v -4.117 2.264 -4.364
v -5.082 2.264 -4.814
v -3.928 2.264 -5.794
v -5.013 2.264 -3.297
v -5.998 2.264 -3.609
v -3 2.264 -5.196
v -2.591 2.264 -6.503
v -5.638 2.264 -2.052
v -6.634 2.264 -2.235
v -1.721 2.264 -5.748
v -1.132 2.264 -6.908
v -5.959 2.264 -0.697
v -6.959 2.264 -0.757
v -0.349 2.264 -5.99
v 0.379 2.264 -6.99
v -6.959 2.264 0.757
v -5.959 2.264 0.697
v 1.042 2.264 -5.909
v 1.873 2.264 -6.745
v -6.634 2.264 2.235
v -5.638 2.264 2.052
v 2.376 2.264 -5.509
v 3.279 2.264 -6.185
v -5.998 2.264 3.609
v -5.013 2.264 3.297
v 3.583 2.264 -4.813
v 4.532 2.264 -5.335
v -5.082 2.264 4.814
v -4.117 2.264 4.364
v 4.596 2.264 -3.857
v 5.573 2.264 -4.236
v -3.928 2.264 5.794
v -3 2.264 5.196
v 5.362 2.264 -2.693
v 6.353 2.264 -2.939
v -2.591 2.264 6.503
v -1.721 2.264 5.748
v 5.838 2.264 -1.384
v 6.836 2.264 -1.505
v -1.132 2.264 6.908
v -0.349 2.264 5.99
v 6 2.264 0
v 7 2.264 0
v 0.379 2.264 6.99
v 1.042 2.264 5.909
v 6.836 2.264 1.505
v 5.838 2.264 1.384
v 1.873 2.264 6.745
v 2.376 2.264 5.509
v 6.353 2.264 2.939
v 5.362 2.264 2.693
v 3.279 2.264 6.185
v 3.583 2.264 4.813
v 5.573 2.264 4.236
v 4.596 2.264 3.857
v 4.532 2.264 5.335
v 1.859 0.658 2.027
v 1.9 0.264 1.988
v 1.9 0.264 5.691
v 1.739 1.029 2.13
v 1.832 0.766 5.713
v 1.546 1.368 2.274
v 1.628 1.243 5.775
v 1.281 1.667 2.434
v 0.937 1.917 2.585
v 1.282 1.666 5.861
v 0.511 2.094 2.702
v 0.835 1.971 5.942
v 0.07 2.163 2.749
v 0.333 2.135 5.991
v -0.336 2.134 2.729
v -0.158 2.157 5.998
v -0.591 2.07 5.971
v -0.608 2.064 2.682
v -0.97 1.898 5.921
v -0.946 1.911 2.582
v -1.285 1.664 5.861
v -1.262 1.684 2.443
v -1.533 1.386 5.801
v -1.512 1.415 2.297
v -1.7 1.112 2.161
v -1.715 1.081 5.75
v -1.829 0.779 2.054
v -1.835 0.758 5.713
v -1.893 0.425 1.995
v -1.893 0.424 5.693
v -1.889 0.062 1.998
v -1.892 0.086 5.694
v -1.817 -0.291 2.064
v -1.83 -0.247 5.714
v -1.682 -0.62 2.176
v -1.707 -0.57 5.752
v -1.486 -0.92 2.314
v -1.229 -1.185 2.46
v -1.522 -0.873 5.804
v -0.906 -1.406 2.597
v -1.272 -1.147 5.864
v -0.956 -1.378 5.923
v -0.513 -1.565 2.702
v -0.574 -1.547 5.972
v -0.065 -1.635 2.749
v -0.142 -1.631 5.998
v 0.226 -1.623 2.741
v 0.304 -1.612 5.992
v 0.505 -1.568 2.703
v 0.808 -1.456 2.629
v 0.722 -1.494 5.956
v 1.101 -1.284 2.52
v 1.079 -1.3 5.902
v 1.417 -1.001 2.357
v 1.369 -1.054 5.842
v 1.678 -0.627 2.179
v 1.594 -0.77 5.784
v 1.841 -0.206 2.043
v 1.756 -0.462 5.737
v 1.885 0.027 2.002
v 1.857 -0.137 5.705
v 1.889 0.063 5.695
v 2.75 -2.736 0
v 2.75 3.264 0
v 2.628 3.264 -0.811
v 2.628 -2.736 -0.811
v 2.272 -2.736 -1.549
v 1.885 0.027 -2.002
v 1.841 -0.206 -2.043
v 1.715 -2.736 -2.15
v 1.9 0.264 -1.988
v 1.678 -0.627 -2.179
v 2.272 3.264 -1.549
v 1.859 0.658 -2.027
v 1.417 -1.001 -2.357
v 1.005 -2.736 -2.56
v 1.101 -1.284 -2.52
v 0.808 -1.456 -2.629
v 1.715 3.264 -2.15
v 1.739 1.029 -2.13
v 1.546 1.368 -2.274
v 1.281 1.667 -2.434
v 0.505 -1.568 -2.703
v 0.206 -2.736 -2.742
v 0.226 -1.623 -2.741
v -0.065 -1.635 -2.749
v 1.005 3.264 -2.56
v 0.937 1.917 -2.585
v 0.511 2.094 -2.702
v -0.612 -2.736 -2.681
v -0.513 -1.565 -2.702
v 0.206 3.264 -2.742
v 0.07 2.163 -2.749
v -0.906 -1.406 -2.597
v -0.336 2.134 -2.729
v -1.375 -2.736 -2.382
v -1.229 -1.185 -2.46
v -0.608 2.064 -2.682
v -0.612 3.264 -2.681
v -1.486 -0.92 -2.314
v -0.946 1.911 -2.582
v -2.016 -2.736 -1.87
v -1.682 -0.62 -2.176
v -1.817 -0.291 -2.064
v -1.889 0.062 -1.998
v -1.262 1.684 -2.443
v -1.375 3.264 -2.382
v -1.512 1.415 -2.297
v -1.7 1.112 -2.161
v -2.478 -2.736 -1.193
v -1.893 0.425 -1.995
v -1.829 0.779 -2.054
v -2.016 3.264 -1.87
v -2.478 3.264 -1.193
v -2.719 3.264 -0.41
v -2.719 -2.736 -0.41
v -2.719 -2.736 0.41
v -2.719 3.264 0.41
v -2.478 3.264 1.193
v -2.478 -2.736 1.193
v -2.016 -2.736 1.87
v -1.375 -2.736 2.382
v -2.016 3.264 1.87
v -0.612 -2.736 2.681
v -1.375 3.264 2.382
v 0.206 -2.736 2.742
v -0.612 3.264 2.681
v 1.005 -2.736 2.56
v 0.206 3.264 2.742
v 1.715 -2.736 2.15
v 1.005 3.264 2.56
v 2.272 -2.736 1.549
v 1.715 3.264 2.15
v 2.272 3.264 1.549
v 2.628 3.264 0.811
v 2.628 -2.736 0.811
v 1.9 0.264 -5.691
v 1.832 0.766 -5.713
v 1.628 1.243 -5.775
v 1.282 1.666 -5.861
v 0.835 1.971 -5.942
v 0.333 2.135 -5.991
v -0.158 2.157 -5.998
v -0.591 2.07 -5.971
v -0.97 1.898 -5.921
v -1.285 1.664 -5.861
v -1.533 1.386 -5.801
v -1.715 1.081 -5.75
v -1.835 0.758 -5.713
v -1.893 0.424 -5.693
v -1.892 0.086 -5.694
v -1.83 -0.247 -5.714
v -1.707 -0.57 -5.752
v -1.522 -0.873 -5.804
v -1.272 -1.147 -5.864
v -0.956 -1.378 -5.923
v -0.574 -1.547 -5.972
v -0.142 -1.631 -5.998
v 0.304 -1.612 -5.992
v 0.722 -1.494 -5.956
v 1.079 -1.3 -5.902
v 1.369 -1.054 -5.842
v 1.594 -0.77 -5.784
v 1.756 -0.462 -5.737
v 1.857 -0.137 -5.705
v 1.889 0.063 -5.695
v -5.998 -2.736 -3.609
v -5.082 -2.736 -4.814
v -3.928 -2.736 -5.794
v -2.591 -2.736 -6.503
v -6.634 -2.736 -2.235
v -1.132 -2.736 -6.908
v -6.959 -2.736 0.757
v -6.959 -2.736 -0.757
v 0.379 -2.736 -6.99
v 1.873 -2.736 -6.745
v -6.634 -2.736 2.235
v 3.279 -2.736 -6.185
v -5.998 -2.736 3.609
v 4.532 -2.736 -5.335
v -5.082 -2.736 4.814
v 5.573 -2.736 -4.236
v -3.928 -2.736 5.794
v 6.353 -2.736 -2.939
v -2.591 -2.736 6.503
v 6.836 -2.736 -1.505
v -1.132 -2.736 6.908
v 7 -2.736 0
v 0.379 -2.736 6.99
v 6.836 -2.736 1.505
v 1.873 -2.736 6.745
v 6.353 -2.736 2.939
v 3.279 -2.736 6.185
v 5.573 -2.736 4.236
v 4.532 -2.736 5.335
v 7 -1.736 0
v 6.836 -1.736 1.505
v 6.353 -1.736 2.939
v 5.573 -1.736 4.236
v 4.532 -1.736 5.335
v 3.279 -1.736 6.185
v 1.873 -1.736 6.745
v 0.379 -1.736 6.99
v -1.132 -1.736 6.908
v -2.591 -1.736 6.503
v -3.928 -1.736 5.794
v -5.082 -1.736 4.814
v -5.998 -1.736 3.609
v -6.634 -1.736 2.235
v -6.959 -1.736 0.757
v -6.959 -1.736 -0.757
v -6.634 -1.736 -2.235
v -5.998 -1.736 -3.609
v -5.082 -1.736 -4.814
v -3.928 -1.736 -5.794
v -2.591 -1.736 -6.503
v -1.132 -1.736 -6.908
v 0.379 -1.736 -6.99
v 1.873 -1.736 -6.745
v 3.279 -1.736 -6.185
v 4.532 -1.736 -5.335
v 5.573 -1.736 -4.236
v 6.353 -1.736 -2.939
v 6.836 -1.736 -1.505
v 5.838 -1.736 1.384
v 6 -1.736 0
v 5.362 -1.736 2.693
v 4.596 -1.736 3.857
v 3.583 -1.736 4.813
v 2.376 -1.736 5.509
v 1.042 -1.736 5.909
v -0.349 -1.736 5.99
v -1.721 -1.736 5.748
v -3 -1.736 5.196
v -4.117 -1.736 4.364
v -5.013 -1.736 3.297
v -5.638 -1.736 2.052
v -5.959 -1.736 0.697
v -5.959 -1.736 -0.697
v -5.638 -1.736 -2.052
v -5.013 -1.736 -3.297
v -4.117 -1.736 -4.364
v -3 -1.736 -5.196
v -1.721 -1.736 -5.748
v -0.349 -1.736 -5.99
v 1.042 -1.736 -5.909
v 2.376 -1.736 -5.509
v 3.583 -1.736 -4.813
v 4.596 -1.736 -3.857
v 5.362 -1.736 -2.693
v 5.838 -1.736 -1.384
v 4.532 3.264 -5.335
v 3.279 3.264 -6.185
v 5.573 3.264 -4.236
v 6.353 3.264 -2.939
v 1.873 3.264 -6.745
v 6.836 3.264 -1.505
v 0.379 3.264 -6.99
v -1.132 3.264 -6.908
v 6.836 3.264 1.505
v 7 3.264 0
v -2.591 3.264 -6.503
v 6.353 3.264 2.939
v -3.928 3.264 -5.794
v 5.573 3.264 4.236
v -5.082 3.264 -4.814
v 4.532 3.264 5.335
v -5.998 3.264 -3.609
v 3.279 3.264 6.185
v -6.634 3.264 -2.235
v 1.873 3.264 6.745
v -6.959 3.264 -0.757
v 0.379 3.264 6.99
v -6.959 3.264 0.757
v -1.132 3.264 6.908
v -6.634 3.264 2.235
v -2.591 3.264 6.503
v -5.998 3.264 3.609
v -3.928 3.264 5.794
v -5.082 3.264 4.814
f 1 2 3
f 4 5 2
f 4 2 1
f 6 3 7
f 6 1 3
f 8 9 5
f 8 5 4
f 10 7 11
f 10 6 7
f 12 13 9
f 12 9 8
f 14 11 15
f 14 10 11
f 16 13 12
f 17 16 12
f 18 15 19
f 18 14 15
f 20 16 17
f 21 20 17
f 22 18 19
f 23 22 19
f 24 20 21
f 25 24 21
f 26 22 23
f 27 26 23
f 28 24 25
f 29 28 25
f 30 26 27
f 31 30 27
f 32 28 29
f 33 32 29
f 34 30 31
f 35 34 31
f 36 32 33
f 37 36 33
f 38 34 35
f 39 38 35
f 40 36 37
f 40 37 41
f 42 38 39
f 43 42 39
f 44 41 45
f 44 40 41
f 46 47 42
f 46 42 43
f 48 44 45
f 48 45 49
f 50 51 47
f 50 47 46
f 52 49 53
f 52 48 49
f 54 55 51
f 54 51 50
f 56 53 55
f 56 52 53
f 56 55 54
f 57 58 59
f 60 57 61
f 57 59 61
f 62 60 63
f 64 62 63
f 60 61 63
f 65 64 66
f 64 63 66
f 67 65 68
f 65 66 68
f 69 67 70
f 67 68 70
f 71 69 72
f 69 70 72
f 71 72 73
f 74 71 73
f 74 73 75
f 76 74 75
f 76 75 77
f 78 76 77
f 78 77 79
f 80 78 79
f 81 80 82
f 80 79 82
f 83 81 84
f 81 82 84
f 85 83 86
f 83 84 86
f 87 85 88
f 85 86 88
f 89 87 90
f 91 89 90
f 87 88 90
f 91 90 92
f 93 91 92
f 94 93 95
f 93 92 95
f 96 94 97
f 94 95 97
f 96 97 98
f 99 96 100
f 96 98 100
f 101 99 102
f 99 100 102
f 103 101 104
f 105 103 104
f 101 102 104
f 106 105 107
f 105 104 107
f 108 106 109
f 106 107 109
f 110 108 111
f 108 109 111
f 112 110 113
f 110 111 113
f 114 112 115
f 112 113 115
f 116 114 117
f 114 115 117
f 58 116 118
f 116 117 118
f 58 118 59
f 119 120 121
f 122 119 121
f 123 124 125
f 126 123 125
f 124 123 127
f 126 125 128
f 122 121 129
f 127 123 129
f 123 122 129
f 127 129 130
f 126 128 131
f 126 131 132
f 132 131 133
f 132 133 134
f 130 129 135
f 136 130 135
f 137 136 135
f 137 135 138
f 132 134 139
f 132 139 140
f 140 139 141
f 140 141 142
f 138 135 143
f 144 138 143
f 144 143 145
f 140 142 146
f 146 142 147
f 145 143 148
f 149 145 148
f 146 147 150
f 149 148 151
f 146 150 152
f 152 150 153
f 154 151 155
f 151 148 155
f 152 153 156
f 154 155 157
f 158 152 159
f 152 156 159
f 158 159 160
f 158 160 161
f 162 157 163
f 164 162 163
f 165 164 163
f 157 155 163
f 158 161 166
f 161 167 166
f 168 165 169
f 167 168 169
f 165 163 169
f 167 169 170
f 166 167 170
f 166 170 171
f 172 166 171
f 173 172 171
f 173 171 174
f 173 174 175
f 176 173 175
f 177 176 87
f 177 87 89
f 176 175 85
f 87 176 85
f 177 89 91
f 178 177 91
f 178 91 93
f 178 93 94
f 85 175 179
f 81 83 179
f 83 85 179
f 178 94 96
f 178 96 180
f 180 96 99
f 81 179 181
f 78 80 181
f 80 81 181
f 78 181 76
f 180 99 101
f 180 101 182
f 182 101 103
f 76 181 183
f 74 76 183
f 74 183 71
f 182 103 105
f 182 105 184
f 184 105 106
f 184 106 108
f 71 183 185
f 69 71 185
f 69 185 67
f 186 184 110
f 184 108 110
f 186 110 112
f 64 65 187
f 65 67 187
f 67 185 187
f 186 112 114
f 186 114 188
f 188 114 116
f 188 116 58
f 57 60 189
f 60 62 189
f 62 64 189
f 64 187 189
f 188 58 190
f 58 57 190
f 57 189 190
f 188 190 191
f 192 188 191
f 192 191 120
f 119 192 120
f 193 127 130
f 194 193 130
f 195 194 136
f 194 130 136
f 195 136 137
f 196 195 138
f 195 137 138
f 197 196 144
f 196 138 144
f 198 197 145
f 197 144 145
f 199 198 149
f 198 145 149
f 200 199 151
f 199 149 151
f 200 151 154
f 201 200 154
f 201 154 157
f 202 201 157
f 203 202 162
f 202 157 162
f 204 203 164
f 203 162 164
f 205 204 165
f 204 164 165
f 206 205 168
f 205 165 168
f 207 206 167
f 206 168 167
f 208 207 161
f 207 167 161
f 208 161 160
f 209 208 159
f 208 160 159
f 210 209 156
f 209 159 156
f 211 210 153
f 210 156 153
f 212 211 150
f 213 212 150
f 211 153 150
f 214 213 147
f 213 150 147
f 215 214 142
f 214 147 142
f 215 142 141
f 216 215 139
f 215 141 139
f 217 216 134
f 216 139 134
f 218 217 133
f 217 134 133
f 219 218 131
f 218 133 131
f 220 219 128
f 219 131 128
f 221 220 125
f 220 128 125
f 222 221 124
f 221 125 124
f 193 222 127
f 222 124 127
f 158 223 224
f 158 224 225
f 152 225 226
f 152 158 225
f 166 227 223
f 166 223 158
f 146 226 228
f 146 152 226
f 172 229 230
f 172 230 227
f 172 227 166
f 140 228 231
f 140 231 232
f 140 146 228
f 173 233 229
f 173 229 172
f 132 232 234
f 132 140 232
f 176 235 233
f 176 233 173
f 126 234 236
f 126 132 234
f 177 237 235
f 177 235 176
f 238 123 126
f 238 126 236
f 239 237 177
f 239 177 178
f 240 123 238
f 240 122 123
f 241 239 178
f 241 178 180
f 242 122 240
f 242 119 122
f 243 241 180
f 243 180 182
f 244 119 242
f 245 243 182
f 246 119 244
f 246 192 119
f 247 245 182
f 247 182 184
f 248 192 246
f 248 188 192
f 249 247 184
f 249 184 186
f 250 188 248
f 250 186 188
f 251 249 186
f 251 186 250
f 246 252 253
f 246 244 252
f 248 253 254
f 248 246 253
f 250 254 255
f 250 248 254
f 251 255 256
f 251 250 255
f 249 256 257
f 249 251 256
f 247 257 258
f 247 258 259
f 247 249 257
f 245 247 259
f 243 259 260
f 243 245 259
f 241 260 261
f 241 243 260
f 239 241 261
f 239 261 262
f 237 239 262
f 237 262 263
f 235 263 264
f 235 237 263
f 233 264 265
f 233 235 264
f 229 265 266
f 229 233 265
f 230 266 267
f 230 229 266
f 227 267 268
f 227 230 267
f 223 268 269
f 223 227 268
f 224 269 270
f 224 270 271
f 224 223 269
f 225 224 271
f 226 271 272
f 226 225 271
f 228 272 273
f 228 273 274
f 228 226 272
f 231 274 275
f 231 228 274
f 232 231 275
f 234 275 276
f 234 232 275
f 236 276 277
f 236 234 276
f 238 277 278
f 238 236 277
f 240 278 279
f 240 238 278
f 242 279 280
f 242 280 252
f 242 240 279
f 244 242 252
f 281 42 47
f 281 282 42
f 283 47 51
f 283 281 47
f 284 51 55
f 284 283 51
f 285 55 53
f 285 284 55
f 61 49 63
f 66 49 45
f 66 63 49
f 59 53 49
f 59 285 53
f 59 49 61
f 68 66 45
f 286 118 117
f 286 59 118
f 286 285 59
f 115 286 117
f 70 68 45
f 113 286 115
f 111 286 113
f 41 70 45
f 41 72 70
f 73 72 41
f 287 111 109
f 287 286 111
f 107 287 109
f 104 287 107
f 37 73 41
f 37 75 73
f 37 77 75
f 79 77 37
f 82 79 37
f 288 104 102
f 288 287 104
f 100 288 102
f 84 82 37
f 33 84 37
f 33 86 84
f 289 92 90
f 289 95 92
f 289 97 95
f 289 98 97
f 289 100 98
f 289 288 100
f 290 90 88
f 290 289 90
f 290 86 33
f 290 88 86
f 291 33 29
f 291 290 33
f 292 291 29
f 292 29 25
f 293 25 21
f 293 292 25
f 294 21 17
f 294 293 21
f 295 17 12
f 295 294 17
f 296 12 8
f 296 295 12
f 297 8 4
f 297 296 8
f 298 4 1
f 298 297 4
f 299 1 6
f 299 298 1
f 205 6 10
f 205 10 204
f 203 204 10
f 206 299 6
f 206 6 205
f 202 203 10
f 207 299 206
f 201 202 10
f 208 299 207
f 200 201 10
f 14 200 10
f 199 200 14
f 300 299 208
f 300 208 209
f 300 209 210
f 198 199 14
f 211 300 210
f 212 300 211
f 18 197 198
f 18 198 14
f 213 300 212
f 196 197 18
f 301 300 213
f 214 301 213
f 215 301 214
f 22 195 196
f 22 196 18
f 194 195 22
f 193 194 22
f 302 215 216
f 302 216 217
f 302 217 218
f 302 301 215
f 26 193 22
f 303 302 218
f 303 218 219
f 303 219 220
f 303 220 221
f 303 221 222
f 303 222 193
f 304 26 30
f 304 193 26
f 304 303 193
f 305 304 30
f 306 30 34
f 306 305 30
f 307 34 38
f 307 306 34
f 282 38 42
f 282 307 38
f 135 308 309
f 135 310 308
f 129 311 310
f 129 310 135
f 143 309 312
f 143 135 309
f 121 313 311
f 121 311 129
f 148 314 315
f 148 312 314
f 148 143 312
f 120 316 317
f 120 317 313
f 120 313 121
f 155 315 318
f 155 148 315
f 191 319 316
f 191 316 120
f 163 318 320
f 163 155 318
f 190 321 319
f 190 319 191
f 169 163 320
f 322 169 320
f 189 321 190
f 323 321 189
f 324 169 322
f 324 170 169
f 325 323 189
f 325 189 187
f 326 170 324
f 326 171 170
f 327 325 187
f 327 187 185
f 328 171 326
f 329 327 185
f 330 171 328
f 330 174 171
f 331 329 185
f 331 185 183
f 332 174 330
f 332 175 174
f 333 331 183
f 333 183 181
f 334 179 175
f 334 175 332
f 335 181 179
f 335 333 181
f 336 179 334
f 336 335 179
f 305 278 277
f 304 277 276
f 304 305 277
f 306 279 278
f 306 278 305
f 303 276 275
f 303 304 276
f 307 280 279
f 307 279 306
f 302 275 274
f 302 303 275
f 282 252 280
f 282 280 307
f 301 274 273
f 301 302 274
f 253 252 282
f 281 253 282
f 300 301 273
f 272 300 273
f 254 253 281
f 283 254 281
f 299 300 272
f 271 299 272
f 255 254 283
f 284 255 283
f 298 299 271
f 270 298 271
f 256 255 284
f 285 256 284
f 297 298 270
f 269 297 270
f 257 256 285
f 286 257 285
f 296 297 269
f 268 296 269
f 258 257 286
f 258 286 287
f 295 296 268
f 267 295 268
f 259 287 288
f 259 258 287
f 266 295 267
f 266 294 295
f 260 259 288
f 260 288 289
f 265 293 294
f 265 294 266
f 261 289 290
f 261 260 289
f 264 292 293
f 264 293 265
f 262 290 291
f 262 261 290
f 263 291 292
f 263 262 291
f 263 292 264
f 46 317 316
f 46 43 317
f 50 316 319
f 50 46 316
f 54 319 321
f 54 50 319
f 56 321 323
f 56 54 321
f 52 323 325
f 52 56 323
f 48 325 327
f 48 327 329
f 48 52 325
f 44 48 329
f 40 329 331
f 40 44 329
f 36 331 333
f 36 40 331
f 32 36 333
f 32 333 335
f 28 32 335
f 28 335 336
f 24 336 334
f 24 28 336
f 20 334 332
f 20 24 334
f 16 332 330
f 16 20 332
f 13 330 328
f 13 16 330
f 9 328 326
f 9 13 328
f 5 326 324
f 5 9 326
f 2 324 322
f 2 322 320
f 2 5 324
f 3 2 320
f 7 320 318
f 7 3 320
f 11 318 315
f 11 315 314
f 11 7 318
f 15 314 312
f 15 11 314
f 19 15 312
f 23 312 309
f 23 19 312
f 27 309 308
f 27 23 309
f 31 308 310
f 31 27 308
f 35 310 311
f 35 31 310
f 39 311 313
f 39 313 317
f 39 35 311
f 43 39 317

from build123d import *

# Parameters (mm, degrees)
SKETCH_4_R               = 1.9
CUT_EXTRUDE_3_DEPTH      = 8
CUT_EXTRUDE_3_DEPTH_BACK = 8
SKETCH_5_R               = 2.75
CUT_EXTRUDE_4_DEPTH      = 10


with BuildPart() as part:
    # 스케치2 → 회전2 (revolve)
    with BuildSketch(Plane.XY):
        Polygon((0, 3.263948498), (7, 3.263948498), (7, 2.263948498), (6, 2.263948498), (6, -1.736051502), (7, -1.736051502), (7, -2.736051502), (0, -2.736051502), align=None)
    revolve(axis=Axis((0, 3.263948498, 0), (0, -1, 0)))

    # 스케치4 → 컷-돌출3 (cut, two sides)
    with BuildSketch(Plane.XY) as cut_extrude_3_sk:
        with Locations((0, 0.263948498)):
            Circle(SKETCH_4_R)
    extrude(amount=CUT_EXTRUDE_3_DEPTH, mode=Mode.SUBTRACT)
    extrude(cut_extrude_3_sk.sketch, amount=-CUT_EXTRUDE_3_DEPTH_BACK, mode=Mode.SUBTRACT)

    # 스케치5 → 컷-돌출4 (cut)
    with BuildSketch(Plane(origin=(0, 3.263948498, 0), x_dir=(1, 0, 0), z_dir=(0, 1, 0))):
        Circle(SKETCH_5_R)
    extrude(amount=-CUT_EXTRUDE_4_DEPTH, mode=Mode.SUBTRACT)


solid = part.part
